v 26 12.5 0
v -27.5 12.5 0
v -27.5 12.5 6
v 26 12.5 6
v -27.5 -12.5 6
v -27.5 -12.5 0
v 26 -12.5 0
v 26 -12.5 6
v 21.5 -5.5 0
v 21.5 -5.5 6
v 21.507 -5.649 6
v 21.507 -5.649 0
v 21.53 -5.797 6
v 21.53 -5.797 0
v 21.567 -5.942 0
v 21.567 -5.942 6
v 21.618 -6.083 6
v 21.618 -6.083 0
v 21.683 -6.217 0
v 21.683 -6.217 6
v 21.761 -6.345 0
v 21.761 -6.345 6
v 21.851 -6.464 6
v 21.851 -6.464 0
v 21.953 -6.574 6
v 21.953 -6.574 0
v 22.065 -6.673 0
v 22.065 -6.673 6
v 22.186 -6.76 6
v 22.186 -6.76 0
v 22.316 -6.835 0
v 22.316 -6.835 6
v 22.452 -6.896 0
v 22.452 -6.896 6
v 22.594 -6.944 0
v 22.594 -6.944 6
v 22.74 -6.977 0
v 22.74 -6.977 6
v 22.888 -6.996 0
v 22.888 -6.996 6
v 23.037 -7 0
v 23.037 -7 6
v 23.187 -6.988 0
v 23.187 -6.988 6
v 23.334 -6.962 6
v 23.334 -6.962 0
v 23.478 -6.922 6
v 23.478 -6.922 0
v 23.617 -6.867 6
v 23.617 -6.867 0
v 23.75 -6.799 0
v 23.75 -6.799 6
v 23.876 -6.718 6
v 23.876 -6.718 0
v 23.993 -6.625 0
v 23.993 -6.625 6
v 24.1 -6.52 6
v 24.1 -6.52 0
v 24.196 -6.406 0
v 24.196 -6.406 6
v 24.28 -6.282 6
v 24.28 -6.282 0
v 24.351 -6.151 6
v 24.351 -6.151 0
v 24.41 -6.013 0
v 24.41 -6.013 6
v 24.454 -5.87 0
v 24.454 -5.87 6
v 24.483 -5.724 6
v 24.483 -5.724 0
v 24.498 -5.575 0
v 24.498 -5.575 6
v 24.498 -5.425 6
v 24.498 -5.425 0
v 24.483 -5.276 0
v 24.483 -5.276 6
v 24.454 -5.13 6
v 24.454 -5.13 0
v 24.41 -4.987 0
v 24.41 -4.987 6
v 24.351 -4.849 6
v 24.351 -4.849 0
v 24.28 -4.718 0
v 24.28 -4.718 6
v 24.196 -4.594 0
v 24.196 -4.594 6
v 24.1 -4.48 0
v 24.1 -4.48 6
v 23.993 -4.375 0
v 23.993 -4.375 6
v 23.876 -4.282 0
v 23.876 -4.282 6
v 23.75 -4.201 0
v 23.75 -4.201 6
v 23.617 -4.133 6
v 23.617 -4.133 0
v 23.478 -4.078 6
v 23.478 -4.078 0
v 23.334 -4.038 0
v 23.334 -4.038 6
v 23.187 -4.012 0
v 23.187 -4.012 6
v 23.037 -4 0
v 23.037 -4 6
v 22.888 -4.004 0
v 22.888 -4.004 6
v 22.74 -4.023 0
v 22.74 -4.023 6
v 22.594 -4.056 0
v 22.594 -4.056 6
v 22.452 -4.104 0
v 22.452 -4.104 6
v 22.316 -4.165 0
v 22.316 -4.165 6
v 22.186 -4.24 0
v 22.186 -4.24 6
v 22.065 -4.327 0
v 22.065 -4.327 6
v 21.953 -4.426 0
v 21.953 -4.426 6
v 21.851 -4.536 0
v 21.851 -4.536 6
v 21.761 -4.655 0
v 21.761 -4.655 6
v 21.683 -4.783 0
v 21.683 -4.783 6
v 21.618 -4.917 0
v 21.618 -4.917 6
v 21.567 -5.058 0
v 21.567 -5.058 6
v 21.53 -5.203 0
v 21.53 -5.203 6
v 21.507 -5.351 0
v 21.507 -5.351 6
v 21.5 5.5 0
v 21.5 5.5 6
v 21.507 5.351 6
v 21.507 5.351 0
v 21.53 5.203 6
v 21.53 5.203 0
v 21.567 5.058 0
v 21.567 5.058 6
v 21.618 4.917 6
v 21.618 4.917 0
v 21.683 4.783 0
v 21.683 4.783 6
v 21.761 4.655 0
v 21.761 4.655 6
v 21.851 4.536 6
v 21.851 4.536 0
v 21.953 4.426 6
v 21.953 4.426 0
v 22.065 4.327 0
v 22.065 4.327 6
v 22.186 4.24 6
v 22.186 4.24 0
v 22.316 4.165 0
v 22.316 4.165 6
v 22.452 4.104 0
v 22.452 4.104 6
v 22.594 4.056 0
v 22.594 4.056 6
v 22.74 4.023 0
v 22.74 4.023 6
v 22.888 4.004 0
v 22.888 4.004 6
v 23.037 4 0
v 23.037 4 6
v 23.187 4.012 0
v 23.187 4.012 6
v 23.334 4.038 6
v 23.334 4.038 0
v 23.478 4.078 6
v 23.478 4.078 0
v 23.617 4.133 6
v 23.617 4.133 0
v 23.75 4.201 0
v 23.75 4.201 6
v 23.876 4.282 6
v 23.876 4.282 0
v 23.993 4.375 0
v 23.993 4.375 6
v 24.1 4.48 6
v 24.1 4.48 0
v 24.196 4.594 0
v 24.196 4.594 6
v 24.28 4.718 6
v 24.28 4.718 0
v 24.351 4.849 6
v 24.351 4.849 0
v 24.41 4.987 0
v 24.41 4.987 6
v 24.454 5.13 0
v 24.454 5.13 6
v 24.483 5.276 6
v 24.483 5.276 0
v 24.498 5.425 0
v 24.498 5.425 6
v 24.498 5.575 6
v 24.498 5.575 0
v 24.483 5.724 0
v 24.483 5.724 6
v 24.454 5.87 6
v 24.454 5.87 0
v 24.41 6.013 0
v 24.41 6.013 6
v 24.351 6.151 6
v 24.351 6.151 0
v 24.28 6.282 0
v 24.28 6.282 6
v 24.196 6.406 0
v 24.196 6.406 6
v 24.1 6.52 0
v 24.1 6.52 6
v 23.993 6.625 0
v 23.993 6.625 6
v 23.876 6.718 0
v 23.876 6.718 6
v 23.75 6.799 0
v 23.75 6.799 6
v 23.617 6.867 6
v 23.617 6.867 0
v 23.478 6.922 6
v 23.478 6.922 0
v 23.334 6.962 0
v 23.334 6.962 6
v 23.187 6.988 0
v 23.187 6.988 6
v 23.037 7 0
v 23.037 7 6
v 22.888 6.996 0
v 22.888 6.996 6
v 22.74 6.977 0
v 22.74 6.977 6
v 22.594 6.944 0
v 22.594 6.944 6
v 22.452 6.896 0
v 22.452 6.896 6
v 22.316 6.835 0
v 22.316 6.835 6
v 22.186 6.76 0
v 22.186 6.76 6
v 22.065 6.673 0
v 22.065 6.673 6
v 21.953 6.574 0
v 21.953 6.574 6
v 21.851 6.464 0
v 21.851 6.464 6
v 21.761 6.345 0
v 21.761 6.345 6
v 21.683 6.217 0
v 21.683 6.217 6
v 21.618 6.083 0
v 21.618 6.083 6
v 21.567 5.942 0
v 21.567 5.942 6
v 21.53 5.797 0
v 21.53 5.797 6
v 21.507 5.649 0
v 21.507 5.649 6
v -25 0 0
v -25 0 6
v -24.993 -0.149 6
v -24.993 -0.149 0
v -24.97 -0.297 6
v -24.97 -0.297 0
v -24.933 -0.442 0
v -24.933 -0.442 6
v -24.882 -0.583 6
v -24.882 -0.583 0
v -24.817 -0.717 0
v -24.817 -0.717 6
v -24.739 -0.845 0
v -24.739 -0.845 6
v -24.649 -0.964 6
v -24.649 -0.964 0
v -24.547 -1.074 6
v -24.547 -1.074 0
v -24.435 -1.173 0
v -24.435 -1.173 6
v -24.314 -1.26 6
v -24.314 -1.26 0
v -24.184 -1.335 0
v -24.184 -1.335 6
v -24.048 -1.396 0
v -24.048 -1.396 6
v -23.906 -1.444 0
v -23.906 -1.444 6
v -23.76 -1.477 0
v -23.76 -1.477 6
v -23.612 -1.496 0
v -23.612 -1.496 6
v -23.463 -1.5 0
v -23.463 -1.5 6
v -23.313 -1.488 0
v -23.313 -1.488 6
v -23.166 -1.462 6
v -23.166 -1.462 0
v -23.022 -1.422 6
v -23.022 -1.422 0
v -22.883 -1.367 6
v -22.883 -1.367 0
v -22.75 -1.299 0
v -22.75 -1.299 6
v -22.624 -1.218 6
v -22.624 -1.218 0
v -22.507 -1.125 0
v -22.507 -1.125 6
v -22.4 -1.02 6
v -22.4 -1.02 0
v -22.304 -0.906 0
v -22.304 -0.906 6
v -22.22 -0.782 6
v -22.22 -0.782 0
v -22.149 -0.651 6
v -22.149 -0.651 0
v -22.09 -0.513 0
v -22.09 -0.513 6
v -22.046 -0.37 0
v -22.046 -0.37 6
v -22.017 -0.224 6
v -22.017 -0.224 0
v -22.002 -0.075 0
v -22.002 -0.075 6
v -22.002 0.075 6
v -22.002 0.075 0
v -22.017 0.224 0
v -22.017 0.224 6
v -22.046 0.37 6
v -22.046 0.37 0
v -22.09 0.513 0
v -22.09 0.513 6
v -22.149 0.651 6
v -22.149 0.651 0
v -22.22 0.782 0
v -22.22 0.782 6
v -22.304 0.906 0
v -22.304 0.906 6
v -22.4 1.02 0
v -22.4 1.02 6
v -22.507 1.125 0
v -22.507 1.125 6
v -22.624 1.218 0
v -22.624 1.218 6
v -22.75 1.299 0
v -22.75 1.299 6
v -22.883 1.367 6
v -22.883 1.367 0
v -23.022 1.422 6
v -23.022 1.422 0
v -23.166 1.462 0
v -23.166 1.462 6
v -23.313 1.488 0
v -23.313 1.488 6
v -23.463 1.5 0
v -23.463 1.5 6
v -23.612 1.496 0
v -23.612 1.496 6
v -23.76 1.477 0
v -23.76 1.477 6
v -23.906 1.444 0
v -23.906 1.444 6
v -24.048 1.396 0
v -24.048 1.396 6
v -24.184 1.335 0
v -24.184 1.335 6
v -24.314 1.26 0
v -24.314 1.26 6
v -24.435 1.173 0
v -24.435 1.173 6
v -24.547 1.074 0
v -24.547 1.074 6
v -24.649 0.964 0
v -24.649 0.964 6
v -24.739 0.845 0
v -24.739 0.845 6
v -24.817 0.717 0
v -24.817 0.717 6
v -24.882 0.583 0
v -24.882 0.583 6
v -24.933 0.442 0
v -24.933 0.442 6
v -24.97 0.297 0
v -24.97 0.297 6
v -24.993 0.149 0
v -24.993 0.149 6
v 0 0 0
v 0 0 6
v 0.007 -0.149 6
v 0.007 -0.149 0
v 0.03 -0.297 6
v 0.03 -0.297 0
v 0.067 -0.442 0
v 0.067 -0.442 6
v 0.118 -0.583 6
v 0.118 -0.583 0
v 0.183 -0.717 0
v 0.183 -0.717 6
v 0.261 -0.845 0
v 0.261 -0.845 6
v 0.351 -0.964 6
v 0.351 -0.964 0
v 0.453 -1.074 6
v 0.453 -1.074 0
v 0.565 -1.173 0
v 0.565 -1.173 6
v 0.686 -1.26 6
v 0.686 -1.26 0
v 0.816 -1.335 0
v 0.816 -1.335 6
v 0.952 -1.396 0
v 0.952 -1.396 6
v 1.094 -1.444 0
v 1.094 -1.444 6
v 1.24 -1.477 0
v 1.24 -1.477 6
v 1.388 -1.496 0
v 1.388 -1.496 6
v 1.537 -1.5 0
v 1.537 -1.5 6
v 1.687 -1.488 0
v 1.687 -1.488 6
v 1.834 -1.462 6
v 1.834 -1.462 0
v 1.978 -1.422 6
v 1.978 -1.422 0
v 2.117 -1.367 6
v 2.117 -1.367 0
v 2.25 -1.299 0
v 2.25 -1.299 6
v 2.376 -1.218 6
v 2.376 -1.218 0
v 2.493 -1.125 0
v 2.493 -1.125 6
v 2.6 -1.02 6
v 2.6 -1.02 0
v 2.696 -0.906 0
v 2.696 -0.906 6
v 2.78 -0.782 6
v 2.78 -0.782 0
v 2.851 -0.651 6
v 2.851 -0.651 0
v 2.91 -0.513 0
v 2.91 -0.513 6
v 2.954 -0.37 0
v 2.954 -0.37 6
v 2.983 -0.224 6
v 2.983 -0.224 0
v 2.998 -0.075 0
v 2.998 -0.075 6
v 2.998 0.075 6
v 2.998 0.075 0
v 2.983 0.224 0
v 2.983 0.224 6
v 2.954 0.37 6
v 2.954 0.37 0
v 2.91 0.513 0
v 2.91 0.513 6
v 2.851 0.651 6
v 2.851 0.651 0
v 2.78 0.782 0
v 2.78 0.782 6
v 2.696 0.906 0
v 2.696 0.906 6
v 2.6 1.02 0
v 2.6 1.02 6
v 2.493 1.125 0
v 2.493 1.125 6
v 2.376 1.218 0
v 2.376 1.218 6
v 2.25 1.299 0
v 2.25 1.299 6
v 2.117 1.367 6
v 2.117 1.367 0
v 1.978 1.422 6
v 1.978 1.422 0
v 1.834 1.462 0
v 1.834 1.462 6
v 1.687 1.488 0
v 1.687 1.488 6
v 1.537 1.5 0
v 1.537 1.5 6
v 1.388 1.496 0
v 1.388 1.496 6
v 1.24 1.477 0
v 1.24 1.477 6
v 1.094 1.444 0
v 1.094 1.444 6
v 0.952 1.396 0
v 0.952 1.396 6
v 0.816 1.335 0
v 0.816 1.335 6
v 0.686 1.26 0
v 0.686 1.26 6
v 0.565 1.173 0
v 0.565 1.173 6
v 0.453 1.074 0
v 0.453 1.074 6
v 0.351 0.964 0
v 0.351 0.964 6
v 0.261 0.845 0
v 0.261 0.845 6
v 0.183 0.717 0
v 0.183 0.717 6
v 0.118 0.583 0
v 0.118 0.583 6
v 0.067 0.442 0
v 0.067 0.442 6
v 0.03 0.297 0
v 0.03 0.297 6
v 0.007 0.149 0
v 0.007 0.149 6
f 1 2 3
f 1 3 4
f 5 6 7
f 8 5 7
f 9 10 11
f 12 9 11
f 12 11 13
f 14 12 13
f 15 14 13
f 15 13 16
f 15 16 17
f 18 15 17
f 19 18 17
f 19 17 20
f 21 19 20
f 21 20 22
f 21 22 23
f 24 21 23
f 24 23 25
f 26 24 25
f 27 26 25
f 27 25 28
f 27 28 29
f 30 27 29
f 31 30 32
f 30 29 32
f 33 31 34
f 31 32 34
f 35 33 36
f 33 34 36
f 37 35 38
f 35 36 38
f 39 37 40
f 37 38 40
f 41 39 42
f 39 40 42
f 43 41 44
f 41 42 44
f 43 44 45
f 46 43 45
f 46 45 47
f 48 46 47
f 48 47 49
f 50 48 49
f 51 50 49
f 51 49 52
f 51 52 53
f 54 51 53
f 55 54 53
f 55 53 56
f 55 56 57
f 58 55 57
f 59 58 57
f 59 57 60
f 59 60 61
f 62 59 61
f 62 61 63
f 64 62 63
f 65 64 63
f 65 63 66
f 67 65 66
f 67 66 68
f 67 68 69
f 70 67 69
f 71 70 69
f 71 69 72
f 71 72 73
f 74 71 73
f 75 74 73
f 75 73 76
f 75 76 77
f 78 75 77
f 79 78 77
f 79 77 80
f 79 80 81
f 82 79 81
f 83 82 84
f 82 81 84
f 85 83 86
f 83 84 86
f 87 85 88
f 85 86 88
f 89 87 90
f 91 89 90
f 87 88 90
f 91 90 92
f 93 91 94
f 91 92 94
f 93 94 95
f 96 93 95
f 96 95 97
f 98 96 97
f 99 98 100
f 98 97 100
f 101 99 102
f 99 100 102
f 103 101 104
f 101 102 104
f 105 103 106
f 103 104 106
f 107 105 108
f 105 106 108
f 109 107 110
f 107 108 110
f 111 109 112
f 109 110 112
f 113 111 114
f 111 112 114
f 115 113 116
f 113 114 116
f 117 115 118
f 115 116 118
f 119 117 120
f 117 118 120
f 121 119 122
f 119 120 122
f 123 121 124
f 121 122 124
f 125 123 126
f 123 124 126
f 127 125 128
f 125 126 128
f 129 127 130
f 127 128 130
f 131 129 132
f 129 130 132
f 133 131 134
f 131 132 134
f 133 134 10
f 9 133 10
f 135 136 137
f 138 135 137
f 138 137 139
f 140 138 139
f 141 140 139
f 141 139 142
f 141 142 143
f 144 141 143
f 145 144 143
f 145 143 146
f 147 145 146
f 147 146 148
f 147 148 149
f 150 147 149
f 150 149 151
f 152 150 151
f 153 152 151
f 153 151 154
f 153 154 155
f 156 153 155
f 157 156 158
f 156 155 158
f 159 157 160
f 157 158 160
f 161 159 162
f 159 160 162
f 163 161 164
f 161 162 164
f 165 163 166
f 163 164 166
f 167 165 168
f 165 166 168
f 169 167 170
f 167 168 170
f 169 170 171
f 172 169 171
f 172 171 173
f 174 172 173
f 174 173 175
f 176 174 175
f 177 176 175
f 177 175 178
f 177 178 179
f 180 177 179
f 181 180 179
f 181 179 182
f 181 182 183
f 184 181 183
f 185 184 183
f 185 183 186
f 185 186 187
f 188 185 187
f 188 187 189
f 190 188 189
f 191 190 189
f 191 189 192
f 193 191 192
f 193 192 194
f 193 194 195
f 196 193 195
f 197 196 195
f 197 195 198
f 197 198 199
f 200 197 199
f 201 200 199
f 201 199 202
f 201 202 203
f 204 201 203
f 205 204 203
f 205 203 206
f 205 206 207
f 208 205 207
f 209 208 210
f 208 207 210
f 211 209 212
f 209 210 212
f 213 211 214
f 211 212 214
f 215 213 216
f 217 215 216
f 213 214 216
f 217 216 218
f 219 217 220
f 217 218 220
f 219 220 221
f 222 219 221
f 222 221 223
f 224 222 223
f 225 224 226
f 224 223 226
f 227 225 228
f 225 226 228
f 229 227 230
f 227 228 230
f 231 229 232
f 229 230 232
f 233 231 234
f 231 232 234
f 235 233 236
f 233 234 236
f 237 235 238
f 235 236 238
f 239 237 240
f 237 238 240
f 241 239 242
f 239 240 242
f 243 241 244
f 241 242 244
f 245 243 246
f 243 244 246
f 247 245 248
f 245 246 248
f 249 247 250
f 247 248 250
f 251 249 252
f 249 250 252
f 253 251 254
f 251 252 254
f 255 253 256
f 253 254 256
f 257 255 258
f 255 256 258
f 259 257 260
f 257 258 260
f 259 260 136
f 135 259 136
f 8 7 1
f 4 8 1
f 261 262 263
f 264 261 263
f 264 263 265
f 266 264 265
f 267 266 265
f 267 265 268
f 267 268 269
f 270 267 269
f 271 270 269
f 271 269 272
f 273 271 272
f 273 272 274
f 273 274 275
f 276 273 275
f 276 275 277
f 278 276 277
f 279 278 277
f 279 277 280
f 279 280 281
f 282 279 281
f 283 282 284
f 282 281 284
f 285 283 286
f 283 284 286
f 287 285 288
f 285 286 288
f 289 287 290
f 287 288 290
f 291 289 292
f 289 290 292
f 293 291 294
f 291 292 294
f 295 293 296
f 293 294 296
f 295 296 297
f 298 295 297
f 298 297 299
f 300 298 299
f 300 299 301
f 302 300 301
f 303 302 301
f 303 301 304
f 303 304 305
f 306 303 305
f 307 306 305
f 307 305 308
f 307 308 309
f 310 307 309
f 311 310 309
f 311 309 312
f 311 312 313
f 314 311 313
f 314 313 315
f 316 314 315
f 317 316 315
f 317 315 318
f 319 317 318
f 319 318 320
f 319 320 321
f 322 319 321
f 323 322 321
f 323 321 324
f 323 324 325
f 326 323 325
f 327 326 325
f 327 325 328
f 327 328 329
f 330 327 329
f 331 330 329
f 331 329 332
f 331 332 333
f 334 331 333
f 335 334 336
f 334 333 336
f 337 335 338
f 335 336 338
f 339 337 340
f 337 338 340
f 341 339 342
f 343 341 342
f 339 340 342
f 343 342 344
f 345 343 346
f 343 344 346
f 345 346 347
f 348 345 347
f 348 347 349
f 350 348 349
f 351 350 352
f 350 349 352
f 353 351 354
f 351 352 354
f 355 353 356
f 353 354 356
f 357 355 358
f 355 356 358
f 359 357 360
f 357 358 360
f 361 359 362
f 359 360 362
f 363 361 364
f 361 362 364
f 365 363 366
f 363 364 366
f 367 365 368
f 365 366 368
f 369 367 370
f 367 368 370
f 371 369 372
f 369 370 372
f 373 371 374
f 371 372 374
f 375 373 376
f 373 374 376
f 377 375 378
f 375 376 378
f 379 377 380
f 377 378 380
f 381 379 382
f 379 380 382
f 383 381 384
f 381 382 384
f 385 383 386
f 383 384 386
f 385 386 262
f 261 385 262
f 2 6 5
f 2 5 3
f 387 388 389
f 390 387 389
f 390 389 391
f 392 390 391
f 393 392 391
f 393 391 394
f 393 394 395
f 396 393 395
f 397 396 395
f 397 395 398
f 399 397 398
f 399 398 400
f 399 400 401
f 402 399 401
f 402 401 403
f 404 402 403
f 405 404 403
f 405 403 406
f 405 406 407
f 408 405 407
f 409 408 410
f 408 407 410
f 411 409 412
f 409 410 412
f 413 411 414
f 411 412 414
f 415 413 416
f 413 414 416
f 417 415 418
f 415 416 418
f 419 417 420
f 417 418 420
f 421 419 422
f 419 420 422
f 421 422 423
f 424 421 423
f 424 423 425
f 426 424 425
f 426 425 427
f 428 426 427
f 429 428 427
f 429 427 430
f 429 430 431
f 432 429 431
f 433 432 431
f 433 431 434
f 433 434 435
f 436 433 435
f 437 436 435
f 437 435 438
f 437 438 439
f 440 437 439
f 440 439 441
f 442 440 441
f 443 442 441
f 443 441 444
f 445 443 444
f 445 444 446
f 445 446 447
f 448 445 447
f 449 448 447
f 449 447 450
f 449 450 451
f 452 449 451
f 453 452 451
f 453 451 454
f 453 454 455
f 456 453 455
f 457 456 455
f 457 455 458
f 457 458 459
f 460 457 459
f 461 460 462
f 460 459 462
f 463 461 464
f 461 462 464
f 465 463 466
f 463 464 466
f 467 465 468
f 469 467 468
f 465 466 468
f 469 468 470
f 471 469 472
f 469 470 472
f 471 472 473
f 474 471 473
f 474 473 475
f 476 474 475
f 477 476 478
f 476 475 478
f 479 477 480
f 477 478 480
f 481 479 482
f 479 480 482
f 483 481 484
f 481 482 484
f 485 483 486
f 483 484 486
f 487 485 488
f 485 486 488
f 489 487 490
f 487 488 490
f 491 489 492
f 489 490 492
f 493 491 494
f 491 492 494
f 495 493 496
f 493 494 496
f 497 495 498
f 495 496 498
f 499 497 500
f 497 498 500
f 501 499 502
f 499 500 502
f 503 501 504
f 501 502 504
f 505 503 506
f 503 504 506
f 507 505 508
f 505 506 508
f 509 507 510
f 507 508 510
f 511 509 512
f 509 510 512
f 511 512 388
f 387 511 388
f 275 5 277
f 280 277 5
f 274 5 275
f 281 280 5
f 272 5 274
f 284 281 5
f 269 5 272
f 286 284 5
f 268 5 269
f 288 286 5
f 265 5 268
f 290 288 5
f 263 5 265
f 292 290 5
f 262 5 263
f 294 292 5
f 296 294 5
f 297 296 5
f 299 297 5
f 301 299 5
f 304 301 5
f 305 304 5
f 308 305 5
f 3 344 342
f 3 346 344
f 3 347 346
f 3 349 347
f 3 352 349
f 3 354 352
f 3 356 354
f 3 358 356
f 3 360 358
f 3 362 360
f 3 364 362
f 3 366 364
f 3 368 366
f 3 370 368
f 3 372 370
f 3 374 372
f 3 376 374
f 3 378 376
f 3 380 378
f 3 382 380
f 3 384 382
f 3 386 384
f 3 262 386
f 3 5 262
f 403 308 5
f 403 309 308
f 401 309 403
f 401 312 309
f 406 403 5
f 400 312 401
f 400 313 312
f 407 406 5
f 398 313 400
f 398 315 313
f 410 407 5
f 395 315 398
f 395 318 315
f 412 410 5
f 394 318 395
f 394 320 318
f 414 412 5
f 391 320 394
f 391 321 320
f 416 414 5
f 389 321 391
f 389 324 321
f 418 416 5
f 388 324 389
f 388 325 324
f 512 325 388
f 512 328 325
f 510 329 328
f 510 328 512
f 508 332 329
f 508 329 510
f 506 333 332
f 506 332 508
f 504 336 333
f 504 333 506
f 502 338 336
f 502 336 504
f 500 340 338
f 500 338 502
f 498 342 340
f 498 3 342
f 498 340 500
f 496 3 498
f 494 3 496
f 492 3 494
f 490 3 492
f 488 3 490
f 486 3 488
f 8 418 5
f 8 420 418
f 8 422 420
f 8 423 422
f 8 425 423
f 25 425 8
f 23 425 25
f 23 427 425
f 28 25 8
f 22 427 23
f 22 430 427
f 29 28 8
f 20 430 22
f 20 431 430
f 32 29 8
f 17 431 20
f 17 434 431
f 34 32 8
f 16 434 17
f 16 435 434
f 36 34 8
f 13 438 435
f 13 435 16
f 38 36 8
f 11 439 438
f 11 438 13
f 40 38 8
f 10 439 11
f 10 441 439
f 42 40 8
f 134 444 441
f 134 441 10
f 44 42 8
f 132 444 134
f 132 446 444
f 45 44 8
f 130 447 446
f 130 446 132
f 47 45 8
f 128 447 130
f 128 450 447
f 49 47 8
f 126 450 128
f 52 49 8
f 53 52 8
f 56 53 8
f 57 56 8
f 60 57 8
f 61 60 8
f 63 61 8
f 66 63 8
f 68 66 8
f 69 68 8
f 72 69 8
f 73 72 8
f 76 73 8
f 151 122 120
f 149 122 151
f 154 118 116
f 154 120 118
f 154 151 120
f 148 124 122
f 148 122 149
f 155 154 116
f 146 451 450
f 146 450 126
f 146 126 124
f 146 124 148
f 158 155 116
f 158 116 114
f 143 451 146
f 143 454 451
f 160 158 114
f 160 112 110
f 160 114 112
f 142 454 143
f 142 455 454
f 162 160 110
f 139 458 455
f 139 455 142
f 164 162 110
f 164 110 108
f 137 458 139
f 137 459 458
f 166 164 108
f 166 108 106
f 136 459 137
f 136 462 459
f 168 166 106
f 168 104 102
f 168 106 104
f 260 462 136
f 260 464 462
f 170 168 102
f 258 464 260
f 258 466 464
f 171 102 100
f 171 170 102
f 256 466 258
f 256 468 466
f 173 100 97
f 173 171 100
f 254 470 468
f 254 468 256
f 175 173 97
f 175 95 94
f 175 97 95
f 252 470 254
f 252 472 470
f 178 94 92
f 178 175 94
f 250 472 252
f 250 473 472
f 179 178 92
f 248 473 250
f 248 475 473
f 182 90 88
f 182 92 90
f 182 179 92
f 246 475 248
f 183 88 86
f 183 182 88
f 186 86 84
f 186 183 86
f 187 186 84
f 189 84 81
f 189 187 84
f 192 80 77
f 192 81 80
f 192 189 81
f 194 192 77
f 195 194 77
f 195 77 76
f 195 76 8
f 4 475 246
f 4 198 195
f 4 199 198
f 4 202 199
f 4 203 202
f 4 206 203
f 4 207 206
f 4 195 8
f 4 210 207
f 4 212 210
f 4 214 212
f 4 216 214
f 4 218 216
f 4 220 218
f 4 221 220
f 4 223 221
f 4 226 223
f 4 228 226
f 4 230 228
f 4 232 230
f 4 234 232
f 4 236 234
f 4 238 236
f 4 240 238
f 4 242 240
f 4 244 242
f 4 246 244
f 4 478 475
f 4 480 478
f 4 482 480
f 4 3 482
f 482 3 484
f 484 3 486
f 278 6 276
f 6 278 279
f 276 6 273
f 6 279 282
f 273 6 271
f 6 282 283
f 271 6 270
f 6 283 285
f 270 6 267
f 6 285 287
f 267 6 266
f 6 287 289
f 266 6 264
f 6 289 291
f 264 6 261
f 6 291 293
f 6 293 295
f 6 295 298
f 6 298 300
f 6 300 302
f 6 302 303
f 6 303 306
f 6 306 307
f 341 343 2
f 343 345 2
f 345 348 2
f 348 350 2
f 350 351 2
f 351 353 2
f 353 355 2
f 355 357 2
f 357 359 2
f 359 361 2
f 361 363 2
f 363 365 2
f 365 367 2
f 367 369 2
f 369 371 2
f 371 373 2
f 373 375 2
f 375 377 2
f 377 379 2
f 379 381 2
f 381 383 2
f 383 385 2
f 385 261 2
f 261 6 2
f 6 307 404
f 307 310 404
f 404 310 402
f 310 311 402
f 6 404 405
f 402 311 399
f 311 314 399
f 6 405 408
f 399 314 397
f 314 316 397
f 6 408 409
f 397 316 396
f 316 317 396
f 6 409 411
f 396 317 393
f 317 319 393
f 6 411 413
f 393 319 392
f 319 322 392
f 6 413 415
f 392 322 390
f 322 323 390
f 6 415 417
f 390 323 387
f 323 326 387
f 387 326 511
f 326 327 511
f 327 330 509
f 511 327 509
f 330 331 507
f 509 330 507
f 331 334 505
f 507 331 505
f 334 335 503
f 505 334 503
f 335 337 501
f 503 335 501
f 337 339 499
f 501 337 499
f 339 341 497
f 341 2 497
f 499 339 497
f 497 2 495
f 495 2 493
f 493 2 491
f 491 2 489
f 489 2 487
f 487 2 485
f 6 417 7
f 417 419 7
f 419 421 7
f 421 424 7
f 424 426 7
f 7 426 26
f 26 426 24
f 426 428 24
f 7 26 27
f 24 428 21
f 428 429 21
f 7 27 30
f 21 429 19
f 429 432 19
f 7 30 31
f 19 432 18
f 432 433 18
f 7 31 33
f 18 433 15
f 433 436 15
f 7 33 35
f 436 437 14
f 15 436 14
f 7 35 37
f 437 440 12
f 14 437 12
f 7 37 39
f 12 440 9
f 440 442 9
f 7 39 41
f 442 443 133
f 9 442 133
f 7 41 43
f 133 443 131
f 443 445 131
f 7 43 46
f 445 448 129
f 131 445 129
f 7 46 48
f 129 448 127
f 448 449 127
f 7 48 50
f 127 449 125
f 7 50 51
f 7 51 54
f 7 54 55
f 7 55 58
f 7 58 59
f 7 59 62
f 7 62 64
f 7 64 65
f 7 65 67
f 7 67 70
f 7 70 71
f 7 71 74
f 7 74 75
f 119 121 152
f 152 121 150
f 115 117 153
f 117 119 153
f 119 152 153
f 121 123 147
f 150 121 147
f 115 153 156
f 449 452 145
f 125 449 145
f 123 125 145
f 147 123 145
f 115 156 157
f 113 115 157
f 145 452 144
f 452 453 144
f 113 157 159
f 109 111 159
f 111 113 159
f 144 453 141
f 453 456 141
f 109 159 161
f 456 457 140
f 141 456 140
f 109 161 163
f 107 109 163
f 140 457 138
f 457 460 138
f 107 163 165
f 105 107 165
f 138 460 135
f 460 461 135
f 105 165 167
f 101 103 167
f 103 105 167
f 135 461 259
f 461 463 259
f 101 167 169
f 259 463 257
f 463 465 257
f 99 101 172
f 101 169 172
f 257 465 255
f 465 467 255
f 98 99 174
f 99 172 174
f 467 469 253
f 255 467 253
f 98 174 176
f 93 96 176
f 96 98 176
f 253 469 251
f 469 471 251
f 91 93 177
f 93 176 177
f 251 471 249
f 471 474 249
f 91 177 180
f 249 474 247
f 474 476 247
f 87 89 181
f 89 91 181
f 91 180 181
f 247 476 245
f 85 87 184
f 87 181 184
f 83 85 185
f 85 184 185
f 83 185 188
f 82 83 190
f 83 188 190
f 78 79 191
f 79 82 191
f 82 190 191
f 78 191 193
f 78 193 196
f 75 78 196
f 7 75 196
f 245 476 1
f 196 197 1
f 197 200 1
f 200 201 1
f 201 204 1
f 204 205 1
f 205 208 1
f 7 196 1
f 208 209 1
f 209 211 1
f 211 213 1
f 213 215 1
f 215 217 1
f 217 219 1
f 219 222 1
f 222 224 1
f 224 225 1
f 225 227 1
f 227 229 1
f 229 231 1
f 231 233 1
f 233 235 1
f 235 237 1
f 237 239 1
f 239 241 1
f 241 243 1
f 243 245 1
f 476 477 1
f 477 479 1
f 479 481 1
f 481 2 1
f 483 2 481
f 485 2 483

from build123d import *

# Parameters (mm, degrees)
F0_W     = 55
F0_H     = 25
F1_DEPTH = 6
F2_D     = 3
F3_DEPTH = 1.5


# Not quite as in the source:
# - a feature names something its author has since deleted; it is built from what else it names


with BuildPart() as f1:
    # F0 (on Top) → F1 (new body)
    with BuildSketch(Plane.XY):
        Rectangle(F0_W, F0_H)
    extrude(amount=F1_DEPTH)

    # F2 (through all)
    with Locations(Plane(origin=(0, 0, 0), x_dir=(1, 0, 0), z_dir=(0, 0, -1))):
        with Locations((-23.5, 0), (23, -5.5), (23, 5.5), (1.5, 0)):
            Hole(F2_D / 2)

    # F3 (cut): a face of the model
    f3_faces = [f1.faces().sort_by_distance(p)[0] for p in [
        (27.5, 0, 3),
    ]]
    extrude(f3_faces, amount=-F3_DEPTH, mode=Mode.SUBTRACT)


solid = f1.part
